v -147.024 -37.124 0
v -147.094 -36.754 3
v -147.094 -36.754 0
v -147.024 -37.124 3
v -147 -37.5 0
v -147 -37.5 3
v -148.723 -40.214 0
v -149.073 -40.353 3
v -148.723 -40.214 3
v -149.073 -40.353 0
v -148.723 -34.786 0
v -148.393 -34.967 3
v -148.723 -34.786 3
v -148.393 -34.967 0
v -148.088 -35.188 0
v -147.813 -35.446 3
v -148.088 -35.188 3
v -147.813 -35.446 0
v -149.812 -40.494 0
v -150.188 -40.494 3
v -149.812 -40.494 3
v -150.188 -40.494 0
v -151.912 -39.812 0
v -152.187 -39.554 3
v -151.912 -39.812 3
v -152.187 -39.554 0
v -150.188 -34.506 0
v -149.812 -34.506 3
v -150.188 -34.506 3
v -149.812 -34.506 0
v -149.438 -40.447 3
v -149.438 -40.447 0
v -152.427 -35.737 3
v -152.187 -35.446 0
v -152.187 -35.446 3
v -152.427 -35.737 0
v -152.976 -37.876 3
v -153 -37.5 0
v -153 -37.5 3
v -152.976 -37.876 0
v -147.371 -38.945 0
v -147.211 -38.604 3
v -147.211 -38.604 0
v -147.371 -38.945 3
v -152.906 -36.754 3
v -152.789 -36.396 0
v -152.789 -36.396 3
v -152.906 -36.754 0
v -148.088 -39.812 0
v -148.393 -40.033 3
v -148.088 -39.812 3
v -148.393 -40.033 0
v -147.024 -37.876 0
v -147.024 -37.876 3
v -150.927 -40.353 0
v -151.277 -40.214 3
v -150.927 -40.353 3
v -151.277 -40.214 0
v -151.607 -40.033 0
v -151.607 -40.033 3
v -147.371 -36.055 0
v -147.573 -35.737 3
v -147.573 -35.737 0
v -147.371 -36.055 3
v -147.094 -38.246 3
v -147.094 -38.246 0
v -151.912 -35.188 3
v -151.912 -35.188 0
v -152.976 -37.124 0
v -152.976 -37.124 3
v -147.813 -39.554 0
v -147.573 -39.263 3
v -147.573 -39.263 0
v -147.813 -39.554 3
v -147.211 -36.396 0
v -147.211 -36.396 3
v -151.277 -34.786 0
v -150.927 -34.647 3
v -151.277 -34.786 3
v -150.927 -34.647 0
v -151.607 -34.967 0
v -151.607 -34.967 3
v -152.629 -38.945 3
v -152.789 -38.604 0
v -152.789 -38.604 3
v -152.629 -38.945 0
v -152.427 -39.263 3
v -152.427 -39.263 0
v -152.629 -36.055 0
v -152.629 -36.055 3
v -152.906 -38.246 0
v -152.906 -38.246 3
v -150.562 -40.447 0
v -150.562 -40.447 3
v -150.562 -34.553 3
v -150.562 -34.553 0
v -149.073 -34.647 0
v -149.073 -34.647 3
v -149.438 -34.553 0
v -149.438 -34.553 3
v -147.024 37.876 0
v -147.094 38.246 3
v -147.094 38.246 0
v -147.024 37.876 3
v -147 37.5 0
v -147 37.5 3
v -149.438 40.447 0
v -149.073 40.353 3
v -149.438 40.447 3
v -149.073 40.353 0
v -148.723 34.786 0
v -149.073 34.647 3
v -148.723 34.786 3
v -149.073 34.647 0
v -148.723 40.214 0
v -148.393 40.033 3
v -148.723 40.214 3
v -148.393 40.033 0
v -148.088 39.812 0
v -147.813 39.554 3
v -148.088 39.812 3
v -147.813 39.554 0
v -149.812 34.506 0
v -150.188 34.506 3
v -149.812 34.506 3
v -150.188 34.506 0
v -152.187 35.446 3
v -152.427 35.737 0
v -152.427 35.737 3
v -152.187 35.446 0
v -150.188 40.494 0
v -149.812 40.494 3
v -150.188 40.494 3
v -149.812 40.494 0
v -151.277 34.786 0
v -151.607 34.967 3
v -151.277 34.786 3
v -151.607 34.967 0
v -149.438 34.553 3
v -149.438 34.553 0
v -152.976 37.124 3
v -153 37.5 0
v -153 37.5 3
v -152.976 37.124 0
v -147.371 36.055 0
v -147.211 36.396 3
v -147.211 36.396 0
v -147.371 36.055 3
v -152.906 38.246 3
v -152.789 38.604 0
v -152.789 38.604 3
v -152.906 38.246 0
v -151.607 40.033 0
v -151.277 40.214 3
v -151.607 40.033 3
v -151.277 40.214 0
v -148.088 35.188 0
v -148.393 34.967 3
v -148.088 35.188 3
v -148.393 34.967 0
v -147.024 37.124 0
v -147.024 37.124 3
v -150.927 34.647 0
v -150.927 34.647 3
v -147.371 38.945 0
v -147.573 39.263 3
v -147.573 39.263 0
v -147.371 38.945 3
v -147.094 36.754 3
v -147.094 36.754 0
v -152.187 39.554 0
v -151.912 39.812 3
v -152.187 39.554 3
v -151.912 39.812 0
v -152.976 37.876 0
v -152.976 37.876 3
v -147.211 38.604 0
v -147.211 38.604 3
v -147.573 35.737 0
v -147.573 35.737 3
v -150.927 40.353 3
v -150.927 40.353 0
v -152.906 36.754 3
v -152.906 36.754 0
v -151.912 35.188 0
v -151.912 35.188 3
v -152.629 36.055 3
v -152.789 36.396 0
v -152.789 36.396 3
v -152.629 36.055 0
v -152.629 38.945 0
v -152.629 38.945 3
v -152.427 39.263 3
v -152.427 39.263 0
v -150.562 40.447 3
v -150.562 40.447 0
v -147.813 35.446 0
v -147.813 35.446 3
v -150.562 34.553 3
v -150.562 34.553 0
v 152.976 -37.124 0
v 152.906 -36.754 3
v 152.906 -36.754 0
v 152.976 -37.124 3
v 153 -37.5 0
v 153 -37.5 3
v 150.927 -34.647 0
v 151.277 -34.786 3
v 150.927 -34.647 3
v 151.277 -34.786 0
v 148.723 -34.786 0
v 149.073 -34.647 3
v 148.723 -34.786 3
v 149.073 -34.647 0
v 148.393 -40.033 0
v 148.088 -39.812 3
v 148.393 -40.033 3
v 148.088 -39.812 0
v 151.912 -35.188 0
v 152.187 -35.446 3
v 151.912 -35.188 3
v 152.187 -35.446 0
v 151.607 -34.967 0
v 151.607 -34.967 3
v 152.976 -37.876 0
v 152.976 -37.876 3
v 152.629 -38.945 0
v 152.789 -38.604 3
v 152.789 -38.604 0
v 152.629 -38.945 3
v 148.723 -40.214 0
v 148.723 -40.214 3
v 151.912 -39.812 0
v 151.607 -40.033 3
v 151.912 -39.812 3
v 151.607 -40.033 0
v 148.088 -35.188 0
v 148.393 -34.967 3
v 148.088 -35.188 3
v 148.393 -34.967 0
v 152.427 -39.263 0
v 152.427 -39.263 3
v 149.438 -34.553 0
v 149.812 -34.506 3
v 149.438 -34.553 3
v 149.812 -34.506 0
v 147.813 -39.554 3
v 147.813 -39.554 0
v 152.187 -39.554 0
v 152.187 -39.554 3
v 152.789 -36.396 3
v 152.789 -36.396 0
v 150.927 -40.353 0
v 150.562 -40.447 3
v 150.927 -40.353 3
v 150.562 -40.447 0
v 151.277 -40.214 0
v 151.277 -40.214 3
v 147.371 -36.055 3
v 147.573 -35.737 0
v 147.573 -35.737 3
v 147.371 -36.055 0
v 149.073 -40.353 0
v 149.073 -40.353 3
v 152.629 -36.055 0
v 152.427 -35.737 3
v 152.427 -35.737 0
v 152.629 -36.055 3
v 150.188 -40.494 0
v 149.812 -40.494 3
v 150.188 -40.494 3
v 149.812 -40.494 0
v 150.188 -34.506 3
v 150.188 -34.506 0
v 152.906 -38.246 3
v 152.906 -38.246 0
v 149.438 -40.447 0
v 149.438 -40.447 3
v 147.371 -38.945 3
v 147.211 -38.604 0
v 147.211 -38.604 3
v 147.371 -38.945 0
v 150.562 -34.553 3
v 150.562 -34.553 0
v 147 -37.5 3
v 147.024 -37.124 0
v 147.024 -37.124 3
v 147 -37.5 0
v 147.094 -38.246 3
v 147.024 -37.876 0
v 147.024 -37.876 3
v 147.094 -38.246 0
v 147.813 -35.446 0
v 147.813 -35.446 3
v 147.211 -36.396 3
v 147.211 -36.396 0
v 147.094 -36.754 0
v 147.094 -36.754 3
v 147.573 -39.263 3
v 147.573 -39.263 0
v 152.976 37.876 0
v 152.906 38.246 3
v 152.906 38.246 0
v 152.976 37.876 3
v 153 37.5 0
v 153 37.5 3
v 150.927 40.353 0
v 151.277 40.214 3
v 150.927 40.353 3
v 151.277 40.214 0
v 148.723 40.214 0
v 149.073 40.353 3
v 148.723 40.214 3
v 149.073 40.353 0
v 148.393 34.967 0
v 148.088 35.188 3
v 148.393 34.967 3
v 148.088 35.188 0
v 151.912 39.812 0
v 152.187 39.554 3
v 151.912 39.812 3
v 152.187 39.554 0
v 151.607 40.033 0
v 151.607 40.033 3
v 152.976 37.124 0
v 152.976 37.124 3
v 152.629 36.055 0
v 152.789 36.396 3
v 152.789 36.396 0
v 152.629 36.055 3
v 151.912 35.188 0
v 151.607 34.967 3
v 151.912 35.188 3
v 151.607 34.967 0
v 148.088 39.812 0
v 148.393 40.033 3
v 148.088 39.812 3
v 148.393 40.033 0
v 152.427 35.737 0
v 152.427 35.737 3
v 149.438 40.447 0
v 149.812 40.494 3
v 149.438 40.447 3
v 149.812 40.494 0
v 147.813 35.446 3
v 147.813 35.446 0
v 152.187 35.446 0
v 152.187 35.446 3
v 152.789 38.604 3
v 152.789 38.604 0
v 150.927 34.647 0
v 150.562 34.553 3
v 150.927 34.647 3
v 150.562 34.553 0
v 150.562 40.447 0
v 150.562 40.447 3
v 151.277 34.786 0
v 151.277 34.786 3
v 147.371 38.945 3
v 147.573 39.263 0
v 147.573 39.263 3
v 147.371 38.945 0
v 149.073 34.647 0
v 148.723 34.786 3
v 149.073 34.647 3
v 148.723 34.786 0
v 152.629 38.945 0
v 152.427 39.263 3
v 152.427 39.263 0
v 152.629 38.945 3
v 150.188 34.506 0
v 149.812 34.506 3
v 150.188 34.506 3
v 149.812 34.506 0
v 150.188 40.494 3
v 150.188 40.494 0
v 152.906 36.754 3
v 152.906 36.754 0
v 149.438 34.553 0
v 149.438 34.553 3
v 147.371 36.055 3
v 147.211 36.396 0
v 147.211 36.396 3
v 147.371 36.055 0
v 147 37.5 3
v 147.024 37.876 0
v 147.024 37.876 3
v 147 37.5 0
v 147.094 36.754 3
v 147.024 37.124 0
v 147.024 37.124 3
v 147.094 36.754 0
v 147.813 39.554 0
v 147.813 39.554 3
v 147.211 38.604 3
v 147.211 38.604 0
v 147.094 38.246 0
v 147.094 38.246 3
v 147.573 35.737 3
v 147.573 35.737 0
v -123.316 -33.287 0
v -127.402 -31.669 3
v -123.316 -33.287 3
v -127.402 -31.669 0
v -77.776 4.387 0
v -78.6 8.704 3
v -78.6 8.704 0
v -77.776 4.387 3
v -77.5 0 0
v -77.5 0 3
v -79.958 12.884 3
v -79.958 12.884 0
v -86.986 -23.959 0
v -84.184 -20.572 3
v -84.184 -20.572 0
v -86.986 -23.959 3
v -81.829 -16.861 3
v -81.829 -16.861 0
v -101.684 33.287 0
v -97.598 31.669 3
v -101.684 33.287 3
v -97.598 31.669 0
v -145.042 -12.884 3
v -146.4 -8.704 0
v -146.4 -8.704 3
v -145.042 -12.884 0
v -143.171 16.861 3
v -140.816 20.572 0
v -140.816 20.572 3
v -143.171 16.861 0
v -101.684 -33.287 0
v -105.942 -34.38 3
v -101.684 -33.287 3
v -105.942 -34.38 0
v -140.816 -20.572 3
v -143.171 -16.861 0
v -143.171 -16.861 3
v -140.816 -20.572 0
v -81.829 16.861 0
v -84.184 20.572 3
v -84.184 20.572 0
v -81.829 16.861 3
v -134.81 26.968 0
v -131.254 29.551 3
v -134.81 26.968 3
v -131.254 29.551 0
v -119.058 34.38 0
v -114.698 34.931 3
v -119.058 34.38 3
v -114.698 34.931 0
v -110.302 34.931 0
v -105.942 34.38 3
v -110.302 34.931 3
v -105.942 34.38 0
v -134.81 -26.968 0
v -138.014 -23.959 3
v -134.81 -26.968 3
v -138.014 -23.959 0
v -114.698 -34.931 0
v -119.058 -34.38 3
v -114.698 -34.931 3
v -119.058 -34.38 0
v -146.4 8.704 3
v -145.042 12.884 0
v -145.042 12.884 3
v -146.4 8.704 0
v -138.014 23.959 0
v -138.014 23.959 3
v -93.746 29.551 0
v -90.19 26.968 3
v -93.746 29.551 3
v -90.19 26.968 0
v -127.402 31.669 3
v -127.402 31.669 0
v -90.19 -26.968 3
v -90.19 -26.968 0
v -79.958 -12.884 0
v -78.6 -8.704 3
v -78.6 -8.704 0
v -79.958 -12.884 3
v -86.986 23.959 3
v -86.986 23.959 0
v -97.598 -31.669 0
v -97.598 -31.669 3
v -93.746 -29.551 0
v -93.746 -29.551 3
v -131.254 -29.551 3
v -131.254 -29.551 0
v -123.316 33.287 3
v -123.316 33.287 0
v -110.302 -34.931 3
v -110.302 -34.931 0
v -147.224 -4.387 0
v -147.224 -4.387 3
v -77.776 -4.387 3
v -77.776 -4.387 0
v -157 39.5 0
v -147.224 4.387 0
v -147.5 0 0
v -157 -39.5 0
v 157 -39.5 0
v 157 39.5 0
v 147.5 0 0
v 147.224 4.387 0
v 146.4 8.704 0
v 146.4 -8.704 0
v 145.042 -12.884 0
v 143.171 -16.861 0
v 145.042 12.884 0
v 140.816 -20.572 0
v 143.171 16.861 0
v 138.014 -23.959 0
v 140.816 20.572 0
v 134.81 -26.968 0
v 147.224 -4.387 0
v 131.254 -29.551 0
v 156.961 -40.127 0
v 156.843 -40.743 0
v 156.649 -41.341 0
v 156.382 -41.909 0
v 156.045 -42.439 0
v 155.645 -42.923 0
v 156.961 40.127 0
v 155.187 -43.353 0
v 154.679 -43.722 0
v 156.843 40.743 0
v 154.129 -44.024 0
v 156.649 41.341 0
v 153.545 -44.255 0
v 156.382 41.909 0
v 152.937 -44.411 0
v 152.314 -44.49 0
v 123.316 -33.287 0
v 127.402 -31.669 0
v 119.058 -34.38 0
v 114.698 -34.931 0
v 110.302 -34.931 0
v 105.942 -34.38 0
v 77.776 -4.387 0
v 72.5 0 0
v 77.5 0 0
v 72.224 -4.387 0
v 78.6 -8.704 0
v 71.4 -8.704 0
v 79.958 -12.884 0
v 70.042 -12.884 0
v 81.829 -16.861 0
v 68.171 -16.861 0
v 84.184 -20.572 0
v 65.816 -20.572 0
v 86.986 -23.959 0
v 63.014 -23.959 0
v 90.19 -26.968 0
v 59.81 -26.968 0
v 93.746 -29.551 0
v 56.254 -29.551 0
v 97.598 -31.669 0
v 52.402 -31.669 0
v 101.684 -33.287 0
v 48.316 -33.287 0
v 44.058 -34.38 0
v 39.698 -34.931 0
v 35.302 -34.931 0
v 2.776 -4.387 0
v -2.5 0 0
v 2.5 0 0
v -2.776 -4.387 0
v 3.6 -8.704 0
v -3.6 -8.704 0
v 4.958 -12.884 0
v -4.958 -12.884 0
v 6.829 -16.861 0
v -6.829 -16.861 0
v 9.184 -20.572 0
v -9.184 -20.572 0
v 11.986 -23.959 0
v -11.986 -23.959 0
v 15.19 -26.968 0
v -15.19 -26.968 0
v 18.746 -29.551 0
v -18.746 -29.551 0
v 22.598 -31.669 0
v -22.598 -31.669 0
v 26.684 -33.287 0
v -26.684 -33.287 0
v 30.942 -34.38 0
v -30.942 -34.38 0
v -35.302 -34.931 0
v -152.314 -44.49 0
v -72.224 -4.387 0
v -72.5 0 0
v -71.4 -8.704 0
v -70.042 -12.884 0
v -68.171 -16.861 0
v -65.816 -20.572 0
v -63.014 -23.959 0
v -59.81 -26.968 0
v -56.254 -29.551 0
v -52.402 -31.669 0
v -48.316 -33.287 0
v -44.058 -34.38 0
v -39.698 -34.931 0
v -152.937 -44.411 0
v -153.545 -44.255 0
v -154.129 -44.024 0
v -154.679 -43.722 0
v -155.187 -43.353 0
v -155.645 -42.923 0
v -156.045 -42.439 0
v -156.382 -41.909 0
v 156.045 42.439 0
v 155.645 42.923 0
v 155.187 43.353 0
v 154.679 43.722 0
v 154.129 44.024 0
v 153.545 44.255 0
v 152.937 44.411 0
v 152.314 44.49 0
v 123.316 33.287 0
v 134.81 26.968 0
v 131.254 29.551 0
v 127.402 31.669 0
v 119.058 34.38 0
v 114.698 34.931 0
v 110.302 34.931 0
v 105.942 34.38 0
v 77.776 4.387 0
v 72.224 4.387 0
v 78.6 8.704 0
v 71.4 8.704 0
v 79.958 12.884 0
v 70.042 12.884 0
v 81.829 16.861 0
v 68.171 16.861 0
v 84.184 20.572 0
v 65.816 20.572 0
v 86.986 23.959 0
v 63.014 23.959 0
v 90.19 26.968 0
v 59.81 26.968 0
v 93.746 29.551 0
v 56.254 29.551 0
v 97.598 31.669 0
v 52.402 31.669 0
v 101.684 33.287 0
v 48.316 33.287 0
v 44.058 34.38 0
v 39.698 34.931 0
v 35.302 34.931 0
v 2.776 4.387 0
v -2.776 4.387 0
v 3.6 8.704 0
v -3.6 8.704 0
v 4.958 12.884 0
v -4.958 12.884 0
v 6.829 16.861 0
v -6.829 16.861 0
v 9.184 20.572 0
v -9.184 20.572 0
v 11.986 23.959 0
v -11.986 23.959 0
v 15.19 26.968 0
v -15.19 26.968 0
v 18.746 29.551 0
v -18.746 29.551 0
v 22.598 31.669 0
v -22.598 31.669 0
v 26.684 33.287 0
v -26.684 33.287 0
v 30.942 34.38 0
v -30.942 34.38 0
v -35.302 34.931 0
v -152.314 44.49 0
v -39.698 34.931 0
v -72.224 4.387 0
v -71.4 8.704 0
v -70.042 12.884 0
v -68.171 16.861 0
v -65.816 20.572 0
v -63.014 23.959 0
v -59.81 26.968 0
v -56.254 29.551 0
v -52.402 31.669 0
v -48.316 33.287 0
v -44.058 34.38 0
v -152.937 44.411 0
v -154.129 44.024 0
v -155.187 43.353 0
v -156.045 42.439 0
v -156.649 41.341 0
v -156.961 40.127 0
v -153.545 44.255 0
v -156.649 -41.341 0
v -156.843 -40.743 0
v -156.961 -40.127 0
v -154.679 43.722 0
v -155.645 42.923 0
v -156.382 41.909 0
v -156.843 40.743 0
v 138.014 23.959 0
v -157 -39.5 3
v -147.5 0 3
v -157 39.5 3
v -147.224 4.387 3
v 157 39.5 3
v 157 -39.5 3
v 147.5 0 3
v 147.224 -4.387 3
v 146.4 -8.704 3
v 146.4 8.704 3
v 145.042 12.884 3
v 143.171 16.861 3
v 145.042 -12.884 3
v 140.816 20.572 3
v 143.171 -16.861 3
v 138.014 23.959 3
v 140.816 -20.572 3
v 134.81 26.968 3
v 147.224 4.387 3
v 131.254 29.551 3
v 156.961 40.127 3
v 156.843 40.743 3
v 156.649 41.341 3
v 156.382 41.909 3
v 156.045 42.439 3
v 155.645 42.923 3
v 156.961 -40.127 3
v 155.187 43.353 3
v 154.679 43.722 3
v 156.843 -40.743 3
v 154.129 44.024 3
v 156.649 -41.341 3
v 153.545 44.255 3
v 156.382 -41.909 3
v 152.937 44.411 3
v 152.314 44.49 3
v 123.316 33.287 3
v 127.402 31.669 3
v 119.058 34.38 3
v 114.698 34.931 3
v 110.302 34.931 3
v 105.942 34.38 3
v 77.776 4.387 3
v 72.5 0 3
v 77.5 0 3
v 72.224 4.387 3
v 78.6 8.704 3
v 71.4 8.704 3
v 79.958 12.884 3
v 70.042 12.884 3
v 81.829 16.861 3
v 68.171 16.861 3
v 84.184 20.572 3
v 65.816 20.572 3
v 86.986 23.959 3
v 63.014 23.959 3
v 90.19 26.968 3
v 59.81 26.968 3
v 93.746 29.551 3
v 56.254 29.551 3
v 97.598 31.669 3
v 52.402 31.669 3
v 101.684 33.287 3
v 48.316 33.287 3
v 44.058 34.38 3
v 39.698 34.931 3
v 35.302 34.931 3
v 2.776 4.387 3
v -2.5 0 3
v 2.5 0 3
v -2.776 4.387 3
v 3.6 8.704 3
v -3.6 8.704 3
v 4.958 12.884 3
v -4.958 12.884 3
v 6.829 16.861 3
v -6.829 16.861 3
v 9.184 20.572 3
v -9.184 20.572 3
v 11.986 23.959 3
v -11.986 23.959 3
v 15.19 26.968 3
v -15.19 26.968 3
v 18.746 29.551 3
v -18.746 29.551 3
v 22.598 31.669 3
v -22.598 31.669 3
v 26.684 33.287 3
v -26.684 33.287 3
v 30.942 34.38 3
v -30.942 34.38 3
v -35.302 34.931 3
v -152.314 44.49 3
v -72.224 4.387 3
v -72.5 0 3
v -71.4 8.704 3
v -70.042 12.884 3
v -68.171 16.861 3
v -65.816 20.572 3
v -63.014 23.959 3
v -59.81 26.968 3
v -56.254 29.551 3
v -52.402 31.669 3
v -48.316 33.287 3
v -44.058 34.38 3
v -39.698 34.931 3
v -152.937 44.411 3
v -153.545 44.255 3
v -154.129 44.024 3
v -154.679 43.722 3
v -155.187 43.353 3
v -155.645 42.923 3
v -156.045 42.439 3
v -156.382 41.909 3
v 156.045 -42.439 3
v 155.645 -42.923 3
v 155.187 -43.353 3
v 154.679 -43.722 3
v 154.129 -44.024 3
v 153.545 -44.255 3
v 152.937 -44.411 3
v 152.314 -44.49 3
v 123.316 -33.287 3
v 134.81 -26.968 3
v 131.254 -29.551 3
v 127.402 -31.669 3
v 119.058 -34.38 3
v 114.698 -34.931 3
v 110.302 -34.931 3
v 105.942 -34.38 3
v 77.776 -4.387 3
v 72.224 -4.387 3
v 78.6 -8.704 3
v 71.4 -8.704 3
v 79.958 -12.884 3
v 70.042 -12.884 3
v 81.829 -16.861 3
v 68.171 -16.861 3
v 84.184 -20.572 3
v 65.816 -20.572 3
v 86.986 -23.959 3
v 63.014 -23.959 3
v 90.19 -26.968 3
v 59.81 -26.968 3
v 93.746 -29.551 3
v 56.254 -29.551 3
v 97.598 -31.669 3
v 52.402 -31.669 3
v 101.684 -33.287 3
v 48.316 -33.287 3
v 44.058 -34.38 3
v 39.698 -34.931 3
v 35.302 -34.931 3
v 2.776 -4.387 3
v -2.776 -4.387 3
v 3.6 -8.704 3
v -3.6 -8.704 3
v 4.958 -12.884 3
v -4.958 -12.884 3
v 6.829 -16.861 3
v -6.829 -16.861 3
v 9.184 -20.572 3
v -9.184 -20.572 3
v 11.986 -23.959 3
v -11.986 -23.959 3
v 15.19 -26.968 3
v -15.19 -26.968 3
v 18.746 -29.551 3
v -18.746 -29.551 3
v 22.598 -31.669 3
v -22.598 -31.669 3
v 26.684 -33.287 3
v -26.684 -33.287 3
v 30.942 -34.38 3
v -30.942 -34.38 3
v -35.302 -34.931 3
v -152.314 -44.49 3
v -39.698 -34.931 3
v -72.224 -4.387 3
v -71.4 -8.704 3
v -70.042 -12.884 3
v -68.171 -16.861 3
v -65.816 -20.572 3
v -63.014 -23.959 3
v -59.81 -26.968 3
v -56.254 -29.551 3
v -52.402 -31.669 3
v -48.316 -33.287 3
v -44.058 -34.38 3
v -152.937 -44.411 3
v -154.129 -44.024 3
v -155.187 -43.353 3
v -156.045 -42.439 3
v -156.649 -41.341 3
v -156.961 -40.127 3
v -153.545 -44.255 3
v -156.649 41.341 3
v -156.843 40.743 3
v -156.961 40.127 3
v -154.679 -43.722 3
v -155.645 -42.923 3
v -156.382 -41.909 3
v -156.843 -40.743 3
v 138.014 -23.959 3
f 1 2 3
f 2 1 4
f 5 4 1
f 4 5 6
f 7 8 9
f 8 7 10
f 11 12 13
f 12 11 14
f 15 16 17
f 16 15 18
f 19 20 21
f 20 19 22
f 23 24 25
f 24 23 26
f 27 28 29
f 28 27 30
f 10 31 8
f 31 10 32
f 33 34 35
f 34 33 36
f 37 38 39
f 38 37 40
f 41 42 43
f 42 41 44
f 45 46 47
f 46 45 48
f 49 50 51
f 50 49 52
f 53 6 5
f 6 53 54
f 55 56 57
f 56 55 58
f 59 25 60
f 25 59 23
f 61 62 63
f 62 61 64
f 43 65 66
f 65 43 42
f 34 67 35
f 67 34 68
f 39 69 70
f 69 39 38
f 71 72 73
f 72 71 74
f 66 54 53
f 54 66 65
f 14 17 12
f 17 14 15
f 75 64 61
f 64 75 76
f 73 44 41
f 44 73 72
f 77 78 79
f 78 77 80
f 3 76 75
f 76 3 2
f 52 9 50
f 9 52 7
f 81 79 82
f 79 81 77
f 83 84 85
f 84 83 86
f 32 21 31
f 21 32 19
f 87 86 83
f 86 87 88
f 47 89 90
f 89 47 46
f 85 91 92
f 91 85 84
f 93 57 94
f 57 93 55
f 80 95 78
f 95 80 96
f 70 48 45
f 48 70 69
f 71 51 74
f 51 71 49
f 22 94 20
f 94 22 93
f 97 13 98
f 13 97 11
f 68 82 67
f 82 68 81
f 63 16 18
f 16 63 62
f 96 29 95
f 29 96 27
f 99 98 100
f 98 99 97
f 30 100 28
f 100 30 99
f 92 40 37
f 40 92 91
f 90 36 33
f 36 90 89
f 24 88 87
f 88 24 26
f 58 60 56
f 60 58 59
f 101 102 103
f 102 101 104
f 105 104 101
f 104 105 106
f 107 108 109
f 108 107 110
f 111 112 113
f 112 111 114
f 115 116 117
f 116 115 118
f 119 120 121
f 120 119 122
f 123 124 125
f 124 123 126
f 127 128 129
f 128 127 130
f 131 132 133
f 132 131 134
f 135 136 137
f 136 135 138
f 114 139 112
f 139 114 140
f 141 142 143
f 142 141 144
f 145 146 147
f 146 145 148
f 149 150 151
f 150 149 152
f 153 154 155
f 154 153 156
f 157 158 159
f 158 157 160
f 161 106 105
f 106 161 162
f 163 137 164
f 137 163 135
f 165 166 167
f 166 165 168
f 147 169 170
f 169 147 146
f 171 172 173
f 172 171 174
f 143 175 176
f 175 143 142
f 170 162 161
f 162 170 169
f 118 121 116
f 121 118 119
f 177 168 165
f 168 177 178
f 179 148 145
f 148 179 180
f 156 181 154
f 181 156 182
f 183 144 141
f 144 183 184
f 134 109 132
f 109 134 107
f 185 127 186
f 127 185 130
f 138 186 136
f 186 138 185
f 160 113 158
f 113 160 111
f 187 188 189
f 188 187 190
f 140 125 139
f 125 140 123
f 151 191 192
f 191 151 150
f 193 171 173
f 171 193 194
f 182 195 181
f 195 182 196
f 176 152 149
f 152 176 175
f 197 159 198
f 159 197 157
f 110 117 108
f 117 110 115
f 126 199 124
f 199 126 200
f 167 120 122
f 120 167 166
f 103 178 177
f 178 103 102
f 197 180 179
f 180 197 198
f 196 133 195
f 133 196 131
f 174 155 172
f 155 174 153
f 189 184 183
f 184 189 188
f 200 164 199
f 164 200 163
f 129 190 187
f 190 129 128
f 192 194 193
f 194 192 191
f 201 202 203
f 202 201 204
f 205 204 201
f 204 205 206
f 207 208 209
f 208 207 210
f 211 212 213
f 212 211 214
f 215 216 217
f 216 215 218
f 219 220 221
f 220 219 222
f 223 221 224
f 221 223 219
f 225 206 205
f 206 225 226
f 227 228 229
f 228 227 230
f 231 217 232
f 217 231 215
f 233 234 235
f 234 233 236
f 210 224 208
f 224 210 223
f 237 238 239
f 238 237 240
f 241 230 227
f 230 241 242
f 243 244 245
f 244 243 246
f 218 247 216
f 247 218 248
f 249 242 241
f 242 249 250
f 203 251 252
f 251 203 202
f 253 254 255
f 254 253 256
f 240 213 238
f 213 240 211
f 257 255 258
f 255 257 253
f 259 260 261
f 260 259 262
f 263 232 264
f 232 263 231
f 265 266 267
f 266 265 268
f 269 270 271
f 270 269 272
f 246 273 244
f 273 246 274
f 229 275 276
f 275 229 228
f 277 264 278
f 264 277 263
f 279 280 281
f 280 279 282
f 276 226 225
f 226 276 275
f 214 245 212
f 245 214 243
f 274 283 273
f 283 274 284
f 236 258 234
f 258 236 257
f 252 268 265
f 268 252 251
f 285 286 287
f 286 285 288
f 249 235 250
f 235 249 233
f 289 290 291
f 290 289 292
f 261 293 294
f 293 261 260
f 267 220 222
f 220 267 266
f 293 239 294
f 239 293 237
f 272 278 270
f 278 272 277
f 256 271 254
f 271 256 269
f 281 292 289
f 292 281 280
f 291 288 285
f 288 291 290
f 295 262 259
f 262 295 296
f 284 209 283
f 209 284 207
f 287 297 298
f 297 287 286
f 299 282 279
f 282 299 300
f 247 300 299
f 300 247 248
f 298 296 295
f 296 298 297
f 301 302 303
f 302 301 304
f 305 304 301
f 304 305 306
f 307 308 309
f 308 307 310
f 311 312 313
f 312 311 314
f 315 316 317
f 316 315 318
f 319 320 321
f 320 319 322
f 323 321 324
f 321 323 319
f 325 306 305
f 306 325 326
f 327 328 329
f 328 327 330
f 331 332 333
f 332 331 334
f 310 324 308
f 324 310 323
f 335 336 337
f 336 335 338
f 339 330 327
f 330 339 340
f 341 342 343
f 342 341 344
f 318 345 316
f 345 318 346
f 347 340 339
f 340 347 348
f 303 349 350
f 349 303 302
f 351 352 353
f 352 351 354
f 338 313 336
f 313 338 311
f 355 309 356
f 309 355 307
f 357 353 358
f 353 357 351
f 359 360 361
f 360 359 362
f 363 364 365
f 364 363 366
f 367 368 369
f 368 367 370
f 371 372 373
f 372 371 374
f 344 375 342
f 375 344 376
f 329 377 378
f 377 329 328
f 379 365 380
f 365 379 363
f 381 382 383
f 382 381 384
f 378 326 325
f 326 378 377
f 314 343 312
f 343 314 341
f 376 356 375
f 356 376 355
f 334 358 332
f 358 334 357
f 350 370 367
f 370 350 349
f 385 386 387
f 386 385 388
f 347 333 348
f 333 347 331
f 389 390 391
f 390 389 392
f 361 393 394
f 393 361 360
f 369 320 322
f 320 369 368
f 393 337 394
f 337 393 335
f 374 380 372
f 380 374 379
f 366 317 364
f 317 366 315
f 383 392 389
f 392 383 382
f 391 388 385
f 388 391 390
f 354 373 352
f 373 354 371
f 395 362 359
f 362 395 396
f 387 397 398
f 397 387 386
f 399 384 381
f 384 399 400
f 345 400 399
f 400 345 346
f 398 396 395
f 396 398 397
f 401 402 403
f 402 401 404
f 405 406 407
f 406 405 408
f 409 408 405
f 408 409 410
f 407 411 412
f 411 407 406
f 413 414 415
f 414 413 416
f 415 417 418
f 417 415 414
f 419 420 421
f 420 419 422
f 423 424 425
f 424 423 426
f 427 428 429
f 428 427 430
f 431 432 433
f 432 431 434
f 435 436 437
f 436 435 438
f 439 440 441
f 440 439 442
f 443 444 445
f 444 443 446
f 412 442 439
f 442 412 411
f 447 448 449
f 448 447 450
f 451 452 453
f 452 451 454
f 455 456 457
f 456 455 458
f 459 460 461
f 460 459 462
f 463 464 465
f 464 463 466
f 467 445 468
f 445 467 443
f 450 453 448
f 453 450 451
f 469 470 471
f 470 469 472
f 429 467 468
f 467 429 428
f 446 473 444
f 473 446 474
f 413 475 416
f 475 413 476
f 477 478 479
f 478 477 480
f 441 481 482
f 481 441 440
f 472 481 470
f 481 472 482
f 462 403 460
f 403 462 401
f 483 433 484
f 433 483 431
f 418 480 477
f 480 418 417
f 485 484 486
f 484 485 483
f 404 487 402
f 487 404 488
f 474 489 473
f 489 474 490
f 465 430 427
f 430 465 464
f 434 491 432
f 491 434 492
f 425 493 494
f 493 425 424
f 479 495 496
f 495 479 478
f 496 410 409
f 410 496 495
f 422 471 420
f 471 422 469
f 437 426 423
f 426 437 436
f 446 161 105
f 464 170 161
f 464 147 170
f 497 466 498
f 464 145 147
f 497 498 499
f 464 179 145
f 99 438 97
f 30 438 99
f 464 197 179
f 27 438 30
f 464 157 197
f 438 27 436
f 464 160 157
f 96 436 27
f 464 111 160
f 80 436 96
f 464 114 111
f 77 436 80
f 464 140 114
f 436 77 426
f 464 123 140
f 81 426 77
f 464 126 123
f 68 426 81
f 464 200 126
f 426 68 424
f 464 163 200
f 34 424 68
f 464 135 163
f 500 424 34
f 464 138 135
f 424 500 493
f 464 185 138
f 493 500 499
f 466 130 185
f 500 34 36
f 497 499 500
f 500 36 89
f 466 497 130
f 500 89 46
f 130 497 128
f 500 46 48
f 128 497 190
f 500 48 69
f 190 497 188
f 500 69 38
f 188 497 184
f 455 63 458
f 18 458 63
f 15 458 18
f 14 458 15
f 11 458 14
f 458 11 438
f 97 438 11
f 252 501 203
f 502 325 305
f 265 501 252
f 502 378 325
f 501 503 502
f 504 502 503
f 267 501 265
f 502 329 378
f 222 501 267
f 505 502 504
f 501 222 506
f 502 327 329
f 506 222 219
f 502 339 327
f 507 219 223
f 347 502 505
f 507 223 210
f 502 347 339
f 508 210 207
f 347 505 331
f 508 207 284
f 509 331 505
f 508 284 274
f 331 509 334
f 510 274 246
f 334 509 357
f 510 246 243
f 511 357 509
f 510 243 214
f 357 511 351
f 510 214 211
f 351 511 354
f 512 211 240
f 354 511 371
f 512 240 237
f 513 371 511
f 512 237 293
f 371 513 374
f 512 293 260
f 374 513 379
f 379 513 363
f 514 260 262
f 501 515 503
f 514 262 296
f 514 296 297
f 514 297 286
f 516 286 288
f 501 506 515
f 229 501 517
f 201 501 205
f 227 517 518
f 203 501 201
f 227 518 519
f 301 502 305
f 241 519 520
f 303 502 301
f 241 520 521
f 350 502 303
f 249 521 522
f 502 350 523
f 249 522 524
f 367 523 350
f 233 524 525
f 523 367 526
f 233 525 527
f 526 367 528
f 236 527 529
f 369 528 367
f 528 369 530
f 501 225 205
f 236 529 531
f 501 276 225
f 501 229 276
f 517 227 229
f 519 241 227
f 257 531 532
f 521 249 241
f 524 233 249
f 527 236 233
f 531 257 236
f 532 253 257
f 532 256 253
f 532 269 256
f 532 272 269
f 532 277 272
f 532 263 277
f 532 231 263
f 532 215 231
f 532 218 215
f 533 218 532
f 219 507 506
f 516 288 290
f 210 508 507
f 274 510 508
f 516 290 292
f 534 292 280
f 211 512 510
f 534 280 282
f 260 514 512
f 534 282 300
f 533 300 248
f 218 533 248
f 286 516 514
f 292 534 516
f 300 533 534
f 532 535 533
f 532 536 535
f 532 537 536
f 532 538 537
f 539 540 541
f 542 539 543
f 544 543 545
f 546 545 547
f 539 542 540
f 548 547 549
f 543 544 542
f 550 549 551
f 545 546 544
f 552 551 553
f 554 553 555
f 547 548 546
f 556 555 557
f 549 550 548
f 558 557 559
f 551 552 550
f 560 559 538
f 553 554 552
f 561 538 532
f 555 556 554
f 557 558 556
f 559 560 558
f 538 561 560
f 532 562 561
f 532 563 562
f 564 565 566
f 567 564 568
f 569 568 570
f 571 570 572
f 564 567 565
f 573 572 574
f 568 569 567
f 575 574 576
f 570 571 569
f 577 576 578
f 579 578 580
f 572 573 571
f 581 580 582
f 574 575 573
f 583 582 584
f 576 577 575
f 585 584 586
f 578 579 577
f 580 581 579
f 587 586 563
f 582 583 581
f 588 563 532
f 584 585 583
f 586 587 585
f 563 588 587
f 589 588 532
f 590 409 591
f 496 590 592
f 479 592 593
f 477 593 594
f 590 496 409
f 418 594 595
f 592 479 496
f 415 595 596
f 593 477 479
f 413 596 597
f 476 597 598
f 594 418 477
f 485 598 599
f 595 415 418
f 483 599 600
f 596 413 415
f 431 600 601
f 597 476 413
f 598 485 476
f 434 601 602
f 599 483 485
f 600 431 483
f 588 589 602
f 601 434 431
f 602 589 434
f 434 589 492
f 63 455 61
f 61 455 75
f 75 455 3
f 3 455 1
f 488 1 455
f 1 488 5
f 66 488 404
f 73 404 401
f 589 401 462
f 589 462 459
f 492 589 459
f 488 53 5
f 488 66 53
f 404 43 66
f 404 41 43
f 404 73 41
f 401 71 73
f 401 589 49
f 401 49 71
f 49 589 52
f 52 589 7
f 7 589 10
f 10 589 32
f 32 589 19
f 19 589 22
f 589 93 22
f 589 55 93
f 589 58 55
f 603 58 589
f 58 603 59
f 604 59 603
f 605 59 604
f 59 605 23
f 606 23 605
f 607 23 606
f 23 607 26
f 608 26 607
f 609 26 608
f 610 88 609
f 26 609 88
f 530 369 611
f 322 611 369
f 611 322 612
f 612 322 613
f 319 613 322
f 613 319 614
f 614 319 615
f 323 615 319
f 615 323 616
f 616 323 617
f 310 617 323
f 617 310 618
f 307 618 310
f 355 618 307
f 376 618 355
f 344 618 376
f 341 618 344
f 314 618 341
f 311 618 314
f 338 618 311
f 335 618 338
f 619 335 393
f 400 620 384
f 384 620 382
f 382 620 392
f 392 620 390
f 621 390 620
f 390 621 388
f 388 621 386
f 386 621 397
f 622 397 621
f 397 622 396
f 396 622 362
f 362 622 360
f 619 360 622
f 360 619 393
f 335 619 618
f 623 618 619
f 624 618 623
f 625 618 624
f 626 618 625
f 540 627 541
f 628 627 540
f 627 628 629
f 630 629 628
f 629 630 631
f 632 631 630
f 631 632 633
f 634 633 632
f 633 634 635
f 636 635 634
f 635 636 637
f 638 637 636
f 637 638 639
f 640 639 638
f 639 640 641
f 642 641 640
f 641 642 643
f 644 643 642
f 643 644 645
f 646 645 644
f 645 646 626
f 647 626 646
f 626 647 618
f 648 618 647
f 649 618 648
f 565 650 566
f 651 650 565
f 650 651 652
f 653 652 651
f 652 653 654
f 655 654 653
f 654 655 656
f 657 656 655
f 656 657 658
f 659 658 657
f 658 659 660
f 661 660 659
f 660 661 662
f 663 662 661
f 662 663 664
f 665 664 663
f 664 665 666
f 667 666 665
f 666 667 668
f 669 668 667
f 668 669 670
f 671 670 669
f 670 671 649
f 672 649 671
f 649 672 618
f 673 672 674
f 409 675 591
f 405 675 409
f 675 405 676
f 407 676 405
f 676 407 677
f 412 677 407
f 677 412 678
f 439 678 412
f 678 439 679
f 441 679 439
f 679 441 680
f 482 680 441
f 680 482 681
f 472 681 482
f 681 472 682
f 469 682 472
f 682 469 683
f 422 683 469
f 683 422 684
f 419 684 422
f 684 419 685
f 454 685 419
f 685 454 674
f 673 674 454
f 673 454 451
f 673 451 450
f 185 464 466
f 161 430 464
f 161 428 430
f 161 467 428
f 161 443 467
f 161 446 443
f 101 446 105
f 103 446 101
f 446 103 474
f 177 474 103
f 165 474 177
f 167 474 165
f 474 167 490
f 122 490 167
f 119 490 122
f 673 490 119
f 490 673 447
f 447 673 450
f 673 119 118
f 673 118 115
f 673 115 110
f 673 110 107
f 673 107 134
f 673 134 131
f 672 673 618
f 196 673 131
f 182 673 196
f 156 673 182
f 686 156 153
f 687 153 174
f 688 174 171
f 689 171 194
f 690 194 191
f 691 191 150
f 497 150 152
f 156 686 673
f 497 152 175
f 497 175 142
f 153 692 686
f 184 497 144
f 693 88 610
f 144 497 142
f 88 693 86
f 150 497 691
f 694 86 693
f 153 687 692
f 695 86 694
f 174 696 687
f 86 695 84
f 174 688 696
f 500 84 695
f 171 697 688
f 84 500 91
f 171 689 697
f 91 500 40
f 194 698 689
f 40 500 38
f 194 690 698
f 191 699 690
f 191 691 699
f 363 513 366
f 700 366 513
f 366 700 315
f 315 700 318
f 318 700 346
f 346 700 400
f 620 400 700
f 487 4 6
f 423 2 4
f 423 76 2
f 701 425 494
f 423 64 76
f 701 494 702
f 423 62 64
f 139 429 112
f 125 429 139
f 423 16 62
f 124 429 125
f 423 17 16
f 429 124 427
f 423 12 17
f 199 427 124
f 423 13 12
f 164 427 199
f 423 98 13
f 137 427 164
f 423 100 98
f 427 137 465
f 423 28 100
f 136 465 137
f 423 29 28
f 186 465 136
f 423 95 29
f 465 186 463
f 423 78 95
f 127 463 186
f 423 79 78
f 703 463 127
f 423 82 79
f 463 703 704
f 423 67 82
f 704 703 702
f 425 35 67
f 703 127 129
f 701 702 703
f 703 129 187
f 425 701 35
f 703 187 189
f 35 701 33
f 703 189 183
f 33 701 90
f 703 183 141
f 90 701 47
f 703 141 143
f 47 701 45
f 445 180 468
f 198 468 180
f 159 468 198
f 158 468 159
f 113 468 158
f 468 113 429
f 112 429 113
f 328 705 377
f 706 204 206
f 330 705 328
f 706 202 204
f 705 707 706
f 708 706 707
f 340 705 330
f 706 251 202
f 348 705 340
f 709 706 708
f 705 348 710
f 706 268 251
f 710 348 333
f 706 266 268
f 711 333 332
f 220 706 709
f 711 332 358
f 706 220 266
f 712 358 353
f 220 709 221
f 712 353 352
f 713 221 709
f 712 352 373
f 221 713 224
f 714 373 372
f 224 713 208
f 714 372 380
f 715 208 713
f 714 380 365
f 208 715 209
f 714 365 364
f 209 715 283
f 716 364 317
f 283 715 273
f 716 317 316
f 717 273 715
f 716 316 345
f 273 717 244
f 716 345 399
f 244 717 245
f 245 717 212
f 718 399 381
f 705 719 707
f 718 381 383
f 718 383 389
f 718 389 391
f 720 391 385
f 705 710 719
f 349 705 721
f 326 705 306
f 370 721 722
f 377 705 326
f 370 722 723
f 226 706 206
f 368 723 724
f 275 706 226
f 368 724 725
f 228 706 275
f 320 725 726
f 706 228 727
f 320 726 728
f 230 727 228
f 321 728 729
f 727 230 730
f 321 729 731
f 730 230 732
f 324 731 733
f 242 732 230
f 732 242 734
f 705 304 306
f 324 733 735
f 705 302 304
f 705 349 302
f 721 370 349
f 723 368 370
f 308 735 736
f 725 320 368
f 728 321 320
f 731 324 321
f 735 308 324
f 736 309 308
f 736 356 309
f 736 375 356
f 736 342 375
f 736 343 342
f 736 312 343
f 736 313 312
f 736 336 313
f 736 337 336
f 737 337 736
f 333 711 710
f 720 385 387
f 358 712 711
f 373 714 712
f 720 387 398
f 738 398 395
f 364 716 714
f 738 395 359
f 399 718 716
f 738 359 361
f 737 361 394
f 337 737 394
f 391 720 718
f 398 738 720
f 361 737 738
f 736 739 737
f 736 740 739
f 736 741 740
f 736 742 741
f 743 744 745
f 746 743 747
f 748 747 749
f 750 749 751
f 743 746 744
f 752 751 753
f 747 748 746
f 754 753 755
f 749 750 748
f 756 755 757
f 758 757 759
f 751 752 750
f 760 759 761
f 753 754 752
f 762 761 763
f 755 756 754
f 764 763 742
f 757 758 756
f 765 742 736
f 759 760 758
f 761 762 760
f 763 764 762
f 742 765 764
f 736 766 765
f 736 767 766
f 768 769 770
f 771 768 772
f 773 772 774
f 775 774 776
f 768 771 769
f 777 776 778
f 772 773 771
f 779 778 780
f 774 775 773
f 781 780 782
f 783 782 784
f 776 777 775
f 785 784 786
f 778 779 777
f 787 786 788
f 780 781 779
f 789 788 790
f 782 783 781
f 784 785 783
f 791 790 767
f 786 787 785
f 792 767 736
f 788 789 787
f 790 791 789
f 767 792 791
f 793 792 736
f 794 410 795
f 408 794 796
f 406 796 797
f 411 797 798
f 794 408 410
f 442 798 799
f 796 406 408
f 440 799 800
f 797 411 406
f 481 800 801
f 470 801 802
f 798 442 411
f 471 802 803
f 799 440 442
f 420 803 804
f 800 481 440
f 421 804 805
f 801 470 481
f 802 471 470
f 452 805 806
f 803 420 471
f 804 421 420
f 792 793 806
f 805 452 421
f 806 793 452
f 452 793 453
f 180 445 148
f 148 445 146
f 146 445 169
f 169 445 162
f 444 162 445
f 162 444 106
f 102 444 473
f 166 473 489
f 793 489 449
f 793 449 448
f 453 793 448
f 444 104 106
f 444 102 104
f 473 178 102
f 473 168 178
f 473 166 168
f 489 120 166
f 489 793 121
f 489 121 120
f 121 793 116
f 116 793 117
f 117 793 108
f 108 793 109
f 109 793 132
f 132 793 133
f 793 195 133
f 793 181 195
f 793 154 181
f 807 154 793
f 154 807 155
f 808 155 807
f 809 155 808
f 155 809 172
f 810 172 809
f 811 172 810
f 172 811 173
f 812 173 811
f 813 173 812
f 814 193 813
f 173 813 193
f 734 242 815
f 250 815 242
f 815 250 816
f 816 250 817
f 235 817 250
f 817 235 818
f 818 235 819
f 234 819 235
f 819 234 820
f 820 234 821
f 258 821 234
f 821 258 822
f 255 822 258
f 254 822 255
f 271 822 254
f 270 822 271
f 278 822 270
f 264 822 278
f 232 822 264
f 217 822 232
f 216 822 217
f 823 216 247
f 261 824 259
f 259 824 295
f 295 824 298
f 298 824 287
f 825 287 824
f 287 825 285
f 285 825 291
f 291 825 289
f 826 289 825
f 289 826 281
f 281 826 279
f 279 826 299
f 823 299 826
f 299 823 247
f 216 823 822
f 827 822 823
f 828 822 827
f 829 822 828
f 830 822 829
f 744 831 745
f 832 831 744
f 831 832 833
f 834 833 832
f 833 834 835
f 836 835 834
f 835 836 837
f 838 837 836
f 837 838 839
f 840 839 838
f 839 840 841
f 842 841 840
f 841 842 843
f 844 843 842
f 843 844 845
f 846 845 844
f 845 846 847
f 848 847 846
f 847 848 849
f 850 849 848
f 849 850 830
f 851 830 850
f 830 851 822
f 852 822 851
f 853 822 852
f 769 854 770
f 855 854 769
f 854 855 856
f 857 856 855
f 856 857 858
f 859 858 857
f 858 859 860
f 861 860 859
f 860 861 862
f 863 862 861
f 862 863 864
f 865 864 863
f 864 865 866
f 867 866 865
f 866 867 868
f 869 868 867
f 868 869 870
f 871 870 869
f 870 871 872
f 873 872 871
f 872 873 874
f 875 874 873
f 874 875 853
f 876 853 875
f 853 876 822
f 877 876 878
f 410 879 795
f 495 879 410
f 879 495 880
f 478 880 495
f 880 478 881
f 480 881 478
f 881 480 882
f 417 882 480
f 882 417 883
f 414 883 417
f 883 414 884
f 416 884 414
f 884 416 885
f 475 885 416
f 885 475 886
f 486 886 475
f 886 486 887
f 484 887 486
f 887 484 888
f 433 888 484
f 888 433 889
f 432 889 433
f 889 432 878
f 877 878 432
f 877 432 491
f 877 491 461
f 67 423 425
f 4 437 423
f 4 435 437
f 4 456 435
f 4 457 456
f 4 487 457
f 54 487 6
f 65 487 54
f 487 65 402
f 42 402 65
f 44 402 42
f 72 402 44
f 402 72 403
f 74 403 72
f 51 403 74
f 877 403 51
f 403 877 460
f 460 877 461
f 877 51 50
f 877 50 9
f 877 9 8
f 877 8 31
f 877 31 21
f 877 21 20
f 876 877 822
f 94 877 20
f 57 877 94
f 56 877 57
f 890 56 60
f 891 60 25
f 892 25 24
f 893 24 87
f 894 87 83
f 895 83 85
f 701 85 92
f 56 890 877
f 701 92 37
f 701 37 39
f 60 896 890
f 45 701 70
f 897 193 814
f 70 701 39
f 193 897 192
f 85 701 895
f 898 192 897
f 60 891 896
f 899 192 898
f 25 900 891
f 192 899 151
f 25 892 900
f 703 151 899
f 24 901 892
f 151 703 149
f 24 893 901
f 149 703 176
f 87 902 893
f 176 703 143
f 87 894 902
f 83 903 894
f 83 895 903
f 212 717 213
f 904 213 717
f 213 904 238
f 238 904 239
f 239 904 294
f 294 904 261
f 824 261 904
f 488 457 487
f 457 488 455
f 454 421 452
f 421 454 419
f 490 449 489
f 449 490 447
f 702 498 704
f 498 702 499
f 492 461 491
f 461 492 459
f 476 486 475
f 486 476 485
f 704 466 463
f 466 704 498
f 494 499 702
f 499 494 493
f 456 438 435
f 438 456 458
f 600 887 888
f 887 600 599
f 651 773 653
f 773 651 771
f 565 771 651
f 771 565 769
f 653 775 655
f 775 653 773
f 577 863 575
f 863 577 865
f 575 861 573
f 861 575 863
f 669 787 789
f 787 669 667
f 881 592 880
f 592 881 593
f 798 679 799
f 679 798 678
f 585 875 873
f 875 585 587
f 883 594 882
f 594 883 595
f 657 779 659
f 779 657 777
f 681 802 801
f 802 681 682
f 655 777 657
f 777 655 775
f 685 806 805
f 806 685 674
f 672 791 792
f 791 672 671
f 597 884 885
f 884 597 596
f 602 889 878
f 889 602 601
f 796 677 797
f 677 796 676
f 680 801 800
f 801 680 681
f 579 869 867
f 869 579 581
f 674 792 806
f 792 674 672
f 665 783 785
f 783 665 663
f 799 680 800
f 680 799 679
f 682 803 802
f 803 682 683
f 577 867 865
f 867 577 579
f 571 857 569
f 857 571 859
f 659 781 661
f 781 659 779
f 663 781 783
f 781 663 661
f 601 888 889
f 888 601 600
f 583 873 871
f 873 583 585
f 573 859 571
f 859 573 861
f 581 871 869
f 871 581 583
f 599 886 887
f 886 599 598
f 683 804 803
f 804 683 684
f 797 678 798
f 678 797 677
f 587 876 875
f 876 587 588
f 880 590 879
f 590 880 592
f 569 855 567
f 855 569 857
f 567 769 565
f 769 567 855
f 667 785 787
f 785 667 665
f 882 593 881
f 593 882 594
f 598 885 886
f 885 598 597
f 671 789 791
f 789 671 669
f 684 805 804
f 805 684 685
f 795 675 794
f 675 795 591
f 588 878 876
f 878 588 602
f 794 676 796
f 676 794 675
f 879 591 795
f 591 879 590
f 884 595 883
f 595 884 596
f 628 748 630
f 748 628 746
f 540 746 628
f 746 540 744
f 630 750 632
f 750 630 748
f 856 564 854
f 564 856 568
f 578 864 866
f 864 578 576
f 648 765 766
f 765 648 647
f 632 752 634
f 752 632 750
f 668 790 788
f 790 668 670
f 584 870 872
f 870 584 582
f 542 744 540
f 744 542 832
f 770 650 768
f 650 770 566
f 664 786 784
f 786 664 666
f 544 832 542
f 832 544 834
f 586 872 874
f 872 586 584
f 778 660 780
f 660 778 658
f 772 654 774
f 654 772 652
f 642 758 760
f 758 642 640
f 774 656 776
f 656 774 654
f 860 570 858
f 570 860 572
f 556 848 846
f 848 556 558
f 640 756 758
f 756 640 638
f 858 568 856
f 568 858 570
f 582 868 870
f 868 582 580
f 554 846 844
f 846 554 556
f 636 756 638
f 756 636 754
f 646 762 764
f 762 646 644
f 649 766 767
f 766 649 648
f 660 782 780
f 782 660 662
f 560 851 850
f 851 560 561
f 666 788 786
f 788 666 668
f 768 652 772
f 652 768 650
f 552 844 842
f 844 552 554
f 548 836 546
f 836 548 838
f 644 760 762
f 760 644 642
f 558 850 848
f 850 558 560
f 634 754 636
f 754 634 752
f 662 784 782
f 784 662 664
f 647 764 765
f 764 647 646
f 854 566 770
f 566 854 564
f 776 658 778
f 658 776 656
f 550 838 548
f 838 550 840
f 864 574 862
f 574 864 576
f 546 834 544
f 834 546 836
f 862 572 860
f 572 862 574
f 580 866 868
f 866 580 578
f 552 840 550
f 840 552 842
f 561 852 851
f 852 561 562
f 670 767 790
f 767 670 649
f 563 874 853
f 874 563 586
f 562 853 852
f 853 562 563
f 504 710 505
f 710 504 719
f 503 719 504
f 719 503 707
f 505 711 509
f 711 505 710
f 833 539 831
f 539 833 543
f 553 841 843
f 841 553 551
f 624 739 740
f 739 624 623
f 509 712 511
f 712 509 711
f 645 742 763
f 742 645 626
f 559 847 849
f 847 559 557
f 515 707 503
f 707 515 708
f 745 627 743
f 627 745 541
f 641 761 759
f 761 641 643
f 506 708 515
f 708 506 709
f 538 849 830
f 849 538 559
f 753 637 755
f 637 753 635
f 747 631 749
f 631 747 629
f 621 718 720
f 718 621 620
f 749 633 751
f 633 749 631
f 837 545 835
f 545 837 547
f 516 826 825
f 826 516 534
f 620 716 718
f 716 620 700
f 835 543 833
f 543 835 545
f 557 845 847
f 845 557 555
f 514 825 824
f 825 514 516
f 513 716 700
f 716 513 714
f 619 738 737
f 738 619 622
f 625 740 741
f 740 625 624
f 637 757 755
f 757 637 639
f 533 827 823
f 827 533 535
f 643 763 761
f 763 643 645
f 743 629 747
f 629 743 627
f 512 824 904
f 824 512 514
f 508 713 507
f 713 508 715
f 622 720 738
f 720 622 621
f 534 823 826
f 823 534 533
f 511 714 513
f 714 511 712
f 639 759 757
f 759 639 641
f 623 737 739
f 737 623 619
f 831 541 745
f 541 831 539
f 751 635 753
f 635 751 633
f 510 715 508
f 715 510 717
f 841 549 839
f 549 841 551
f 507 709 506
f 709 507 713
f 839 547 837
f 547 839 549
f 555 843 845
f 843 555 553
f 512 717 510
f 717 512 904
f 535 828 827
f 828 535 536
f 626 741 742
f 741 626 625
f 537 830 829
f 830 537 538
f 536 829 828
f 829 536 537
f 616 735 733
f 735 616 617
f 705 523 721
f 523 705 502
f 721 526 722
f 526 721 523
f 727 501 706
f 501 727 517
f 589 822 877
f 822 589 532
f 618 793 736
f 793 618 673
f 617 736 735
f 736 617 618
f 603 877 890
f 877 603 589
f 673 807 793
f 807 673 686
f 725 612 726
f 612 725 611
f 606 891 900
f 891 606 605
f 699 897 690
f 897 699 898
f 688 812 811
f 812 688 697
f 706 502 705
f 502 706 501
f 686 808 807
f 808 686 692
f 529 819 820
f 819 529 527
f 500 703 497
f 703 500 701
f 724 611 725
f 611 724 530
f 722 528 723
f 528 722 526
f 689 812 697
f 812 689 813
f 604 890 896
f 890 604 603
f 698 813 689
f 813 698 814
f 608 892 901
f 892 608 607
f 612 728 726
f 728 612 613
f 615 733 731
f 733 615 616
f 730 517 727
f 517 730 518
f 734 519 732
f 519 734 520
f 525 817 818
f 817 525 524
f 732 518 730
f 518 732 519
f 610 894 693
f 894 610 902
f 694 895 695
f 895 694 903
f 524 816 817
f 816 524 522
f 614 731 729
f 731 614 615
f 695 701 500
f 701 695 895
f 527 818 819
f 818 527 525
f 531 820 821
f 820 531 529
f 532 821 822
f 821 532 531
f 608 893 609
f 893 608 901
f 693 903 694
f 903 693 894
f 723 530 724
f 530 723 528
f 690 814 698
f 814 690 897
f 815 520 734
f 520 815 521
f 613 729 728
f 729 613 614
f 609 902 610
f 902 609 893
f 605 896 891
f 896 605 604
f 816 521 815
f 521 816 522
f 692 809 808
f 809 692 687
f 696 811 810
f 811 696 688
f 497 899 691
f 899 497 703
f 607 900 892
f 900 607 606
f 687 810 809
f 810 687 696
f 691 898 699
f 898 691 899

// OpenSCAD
$fn = 50;


difference() {
	union() {
		hull() {
			translate(v = [-152.0000000000, 39.5000000000, 0]) {
				cylinder(h = 3, r = 5);
			}
			translate(v = [152.0000000000, 39.5000000000, 0]) {
				cylinder(h = 3, r = 5);
			}
			translate(v = [-152.0000000000, -39.5000000000, 0]) {
				cylinder(h = 3, r = 5);
			}
			translate(v = [152.0000000000, -39.5000000000, 0]) {
				cylinder(h = 3, r = 5);
			}
		}
	}
	union() {
		#translate(v = [-150.0000000000, -37.5000000000, -100.0000000000]) {
			cylinder(h = 200, r = 3.0000000000);
		}
		#translate(v = [-150.0000000000, 37.5000000000, -100.0000000000]) {
			cylinder(h = 200, r = 3.0000000000);
		}
		#translate(v = [150.0000000000, -37.5000000000, -100.0000000000]) {
			cylinder(h = 200, r = 3.0000000000);
		}
		#translate(v = [150.0000000000, 37.5000000000, -100.0000000000]) {
			cylinder(h = 200, r = 3.0000000000);
		}
		#translate(v = [-112.5000000000, 0, 0]) {
			cylinder(h = 3, r = 35.0000000000);
		}
		#translate(v = [-37.5000000000, 0, 0]) {
			cylinder(h = 3, r = 35.0000000000);
		}
		#translate(v = [37.5000000000, 0, 0]) {
			cylinder(h = 3, r = 35.0000000000);
		}
		#translate(v = [112.5000000000, 0, 0]) {
			cylinder(h = 3, r = 35.0000000000);
		}
	}
}
